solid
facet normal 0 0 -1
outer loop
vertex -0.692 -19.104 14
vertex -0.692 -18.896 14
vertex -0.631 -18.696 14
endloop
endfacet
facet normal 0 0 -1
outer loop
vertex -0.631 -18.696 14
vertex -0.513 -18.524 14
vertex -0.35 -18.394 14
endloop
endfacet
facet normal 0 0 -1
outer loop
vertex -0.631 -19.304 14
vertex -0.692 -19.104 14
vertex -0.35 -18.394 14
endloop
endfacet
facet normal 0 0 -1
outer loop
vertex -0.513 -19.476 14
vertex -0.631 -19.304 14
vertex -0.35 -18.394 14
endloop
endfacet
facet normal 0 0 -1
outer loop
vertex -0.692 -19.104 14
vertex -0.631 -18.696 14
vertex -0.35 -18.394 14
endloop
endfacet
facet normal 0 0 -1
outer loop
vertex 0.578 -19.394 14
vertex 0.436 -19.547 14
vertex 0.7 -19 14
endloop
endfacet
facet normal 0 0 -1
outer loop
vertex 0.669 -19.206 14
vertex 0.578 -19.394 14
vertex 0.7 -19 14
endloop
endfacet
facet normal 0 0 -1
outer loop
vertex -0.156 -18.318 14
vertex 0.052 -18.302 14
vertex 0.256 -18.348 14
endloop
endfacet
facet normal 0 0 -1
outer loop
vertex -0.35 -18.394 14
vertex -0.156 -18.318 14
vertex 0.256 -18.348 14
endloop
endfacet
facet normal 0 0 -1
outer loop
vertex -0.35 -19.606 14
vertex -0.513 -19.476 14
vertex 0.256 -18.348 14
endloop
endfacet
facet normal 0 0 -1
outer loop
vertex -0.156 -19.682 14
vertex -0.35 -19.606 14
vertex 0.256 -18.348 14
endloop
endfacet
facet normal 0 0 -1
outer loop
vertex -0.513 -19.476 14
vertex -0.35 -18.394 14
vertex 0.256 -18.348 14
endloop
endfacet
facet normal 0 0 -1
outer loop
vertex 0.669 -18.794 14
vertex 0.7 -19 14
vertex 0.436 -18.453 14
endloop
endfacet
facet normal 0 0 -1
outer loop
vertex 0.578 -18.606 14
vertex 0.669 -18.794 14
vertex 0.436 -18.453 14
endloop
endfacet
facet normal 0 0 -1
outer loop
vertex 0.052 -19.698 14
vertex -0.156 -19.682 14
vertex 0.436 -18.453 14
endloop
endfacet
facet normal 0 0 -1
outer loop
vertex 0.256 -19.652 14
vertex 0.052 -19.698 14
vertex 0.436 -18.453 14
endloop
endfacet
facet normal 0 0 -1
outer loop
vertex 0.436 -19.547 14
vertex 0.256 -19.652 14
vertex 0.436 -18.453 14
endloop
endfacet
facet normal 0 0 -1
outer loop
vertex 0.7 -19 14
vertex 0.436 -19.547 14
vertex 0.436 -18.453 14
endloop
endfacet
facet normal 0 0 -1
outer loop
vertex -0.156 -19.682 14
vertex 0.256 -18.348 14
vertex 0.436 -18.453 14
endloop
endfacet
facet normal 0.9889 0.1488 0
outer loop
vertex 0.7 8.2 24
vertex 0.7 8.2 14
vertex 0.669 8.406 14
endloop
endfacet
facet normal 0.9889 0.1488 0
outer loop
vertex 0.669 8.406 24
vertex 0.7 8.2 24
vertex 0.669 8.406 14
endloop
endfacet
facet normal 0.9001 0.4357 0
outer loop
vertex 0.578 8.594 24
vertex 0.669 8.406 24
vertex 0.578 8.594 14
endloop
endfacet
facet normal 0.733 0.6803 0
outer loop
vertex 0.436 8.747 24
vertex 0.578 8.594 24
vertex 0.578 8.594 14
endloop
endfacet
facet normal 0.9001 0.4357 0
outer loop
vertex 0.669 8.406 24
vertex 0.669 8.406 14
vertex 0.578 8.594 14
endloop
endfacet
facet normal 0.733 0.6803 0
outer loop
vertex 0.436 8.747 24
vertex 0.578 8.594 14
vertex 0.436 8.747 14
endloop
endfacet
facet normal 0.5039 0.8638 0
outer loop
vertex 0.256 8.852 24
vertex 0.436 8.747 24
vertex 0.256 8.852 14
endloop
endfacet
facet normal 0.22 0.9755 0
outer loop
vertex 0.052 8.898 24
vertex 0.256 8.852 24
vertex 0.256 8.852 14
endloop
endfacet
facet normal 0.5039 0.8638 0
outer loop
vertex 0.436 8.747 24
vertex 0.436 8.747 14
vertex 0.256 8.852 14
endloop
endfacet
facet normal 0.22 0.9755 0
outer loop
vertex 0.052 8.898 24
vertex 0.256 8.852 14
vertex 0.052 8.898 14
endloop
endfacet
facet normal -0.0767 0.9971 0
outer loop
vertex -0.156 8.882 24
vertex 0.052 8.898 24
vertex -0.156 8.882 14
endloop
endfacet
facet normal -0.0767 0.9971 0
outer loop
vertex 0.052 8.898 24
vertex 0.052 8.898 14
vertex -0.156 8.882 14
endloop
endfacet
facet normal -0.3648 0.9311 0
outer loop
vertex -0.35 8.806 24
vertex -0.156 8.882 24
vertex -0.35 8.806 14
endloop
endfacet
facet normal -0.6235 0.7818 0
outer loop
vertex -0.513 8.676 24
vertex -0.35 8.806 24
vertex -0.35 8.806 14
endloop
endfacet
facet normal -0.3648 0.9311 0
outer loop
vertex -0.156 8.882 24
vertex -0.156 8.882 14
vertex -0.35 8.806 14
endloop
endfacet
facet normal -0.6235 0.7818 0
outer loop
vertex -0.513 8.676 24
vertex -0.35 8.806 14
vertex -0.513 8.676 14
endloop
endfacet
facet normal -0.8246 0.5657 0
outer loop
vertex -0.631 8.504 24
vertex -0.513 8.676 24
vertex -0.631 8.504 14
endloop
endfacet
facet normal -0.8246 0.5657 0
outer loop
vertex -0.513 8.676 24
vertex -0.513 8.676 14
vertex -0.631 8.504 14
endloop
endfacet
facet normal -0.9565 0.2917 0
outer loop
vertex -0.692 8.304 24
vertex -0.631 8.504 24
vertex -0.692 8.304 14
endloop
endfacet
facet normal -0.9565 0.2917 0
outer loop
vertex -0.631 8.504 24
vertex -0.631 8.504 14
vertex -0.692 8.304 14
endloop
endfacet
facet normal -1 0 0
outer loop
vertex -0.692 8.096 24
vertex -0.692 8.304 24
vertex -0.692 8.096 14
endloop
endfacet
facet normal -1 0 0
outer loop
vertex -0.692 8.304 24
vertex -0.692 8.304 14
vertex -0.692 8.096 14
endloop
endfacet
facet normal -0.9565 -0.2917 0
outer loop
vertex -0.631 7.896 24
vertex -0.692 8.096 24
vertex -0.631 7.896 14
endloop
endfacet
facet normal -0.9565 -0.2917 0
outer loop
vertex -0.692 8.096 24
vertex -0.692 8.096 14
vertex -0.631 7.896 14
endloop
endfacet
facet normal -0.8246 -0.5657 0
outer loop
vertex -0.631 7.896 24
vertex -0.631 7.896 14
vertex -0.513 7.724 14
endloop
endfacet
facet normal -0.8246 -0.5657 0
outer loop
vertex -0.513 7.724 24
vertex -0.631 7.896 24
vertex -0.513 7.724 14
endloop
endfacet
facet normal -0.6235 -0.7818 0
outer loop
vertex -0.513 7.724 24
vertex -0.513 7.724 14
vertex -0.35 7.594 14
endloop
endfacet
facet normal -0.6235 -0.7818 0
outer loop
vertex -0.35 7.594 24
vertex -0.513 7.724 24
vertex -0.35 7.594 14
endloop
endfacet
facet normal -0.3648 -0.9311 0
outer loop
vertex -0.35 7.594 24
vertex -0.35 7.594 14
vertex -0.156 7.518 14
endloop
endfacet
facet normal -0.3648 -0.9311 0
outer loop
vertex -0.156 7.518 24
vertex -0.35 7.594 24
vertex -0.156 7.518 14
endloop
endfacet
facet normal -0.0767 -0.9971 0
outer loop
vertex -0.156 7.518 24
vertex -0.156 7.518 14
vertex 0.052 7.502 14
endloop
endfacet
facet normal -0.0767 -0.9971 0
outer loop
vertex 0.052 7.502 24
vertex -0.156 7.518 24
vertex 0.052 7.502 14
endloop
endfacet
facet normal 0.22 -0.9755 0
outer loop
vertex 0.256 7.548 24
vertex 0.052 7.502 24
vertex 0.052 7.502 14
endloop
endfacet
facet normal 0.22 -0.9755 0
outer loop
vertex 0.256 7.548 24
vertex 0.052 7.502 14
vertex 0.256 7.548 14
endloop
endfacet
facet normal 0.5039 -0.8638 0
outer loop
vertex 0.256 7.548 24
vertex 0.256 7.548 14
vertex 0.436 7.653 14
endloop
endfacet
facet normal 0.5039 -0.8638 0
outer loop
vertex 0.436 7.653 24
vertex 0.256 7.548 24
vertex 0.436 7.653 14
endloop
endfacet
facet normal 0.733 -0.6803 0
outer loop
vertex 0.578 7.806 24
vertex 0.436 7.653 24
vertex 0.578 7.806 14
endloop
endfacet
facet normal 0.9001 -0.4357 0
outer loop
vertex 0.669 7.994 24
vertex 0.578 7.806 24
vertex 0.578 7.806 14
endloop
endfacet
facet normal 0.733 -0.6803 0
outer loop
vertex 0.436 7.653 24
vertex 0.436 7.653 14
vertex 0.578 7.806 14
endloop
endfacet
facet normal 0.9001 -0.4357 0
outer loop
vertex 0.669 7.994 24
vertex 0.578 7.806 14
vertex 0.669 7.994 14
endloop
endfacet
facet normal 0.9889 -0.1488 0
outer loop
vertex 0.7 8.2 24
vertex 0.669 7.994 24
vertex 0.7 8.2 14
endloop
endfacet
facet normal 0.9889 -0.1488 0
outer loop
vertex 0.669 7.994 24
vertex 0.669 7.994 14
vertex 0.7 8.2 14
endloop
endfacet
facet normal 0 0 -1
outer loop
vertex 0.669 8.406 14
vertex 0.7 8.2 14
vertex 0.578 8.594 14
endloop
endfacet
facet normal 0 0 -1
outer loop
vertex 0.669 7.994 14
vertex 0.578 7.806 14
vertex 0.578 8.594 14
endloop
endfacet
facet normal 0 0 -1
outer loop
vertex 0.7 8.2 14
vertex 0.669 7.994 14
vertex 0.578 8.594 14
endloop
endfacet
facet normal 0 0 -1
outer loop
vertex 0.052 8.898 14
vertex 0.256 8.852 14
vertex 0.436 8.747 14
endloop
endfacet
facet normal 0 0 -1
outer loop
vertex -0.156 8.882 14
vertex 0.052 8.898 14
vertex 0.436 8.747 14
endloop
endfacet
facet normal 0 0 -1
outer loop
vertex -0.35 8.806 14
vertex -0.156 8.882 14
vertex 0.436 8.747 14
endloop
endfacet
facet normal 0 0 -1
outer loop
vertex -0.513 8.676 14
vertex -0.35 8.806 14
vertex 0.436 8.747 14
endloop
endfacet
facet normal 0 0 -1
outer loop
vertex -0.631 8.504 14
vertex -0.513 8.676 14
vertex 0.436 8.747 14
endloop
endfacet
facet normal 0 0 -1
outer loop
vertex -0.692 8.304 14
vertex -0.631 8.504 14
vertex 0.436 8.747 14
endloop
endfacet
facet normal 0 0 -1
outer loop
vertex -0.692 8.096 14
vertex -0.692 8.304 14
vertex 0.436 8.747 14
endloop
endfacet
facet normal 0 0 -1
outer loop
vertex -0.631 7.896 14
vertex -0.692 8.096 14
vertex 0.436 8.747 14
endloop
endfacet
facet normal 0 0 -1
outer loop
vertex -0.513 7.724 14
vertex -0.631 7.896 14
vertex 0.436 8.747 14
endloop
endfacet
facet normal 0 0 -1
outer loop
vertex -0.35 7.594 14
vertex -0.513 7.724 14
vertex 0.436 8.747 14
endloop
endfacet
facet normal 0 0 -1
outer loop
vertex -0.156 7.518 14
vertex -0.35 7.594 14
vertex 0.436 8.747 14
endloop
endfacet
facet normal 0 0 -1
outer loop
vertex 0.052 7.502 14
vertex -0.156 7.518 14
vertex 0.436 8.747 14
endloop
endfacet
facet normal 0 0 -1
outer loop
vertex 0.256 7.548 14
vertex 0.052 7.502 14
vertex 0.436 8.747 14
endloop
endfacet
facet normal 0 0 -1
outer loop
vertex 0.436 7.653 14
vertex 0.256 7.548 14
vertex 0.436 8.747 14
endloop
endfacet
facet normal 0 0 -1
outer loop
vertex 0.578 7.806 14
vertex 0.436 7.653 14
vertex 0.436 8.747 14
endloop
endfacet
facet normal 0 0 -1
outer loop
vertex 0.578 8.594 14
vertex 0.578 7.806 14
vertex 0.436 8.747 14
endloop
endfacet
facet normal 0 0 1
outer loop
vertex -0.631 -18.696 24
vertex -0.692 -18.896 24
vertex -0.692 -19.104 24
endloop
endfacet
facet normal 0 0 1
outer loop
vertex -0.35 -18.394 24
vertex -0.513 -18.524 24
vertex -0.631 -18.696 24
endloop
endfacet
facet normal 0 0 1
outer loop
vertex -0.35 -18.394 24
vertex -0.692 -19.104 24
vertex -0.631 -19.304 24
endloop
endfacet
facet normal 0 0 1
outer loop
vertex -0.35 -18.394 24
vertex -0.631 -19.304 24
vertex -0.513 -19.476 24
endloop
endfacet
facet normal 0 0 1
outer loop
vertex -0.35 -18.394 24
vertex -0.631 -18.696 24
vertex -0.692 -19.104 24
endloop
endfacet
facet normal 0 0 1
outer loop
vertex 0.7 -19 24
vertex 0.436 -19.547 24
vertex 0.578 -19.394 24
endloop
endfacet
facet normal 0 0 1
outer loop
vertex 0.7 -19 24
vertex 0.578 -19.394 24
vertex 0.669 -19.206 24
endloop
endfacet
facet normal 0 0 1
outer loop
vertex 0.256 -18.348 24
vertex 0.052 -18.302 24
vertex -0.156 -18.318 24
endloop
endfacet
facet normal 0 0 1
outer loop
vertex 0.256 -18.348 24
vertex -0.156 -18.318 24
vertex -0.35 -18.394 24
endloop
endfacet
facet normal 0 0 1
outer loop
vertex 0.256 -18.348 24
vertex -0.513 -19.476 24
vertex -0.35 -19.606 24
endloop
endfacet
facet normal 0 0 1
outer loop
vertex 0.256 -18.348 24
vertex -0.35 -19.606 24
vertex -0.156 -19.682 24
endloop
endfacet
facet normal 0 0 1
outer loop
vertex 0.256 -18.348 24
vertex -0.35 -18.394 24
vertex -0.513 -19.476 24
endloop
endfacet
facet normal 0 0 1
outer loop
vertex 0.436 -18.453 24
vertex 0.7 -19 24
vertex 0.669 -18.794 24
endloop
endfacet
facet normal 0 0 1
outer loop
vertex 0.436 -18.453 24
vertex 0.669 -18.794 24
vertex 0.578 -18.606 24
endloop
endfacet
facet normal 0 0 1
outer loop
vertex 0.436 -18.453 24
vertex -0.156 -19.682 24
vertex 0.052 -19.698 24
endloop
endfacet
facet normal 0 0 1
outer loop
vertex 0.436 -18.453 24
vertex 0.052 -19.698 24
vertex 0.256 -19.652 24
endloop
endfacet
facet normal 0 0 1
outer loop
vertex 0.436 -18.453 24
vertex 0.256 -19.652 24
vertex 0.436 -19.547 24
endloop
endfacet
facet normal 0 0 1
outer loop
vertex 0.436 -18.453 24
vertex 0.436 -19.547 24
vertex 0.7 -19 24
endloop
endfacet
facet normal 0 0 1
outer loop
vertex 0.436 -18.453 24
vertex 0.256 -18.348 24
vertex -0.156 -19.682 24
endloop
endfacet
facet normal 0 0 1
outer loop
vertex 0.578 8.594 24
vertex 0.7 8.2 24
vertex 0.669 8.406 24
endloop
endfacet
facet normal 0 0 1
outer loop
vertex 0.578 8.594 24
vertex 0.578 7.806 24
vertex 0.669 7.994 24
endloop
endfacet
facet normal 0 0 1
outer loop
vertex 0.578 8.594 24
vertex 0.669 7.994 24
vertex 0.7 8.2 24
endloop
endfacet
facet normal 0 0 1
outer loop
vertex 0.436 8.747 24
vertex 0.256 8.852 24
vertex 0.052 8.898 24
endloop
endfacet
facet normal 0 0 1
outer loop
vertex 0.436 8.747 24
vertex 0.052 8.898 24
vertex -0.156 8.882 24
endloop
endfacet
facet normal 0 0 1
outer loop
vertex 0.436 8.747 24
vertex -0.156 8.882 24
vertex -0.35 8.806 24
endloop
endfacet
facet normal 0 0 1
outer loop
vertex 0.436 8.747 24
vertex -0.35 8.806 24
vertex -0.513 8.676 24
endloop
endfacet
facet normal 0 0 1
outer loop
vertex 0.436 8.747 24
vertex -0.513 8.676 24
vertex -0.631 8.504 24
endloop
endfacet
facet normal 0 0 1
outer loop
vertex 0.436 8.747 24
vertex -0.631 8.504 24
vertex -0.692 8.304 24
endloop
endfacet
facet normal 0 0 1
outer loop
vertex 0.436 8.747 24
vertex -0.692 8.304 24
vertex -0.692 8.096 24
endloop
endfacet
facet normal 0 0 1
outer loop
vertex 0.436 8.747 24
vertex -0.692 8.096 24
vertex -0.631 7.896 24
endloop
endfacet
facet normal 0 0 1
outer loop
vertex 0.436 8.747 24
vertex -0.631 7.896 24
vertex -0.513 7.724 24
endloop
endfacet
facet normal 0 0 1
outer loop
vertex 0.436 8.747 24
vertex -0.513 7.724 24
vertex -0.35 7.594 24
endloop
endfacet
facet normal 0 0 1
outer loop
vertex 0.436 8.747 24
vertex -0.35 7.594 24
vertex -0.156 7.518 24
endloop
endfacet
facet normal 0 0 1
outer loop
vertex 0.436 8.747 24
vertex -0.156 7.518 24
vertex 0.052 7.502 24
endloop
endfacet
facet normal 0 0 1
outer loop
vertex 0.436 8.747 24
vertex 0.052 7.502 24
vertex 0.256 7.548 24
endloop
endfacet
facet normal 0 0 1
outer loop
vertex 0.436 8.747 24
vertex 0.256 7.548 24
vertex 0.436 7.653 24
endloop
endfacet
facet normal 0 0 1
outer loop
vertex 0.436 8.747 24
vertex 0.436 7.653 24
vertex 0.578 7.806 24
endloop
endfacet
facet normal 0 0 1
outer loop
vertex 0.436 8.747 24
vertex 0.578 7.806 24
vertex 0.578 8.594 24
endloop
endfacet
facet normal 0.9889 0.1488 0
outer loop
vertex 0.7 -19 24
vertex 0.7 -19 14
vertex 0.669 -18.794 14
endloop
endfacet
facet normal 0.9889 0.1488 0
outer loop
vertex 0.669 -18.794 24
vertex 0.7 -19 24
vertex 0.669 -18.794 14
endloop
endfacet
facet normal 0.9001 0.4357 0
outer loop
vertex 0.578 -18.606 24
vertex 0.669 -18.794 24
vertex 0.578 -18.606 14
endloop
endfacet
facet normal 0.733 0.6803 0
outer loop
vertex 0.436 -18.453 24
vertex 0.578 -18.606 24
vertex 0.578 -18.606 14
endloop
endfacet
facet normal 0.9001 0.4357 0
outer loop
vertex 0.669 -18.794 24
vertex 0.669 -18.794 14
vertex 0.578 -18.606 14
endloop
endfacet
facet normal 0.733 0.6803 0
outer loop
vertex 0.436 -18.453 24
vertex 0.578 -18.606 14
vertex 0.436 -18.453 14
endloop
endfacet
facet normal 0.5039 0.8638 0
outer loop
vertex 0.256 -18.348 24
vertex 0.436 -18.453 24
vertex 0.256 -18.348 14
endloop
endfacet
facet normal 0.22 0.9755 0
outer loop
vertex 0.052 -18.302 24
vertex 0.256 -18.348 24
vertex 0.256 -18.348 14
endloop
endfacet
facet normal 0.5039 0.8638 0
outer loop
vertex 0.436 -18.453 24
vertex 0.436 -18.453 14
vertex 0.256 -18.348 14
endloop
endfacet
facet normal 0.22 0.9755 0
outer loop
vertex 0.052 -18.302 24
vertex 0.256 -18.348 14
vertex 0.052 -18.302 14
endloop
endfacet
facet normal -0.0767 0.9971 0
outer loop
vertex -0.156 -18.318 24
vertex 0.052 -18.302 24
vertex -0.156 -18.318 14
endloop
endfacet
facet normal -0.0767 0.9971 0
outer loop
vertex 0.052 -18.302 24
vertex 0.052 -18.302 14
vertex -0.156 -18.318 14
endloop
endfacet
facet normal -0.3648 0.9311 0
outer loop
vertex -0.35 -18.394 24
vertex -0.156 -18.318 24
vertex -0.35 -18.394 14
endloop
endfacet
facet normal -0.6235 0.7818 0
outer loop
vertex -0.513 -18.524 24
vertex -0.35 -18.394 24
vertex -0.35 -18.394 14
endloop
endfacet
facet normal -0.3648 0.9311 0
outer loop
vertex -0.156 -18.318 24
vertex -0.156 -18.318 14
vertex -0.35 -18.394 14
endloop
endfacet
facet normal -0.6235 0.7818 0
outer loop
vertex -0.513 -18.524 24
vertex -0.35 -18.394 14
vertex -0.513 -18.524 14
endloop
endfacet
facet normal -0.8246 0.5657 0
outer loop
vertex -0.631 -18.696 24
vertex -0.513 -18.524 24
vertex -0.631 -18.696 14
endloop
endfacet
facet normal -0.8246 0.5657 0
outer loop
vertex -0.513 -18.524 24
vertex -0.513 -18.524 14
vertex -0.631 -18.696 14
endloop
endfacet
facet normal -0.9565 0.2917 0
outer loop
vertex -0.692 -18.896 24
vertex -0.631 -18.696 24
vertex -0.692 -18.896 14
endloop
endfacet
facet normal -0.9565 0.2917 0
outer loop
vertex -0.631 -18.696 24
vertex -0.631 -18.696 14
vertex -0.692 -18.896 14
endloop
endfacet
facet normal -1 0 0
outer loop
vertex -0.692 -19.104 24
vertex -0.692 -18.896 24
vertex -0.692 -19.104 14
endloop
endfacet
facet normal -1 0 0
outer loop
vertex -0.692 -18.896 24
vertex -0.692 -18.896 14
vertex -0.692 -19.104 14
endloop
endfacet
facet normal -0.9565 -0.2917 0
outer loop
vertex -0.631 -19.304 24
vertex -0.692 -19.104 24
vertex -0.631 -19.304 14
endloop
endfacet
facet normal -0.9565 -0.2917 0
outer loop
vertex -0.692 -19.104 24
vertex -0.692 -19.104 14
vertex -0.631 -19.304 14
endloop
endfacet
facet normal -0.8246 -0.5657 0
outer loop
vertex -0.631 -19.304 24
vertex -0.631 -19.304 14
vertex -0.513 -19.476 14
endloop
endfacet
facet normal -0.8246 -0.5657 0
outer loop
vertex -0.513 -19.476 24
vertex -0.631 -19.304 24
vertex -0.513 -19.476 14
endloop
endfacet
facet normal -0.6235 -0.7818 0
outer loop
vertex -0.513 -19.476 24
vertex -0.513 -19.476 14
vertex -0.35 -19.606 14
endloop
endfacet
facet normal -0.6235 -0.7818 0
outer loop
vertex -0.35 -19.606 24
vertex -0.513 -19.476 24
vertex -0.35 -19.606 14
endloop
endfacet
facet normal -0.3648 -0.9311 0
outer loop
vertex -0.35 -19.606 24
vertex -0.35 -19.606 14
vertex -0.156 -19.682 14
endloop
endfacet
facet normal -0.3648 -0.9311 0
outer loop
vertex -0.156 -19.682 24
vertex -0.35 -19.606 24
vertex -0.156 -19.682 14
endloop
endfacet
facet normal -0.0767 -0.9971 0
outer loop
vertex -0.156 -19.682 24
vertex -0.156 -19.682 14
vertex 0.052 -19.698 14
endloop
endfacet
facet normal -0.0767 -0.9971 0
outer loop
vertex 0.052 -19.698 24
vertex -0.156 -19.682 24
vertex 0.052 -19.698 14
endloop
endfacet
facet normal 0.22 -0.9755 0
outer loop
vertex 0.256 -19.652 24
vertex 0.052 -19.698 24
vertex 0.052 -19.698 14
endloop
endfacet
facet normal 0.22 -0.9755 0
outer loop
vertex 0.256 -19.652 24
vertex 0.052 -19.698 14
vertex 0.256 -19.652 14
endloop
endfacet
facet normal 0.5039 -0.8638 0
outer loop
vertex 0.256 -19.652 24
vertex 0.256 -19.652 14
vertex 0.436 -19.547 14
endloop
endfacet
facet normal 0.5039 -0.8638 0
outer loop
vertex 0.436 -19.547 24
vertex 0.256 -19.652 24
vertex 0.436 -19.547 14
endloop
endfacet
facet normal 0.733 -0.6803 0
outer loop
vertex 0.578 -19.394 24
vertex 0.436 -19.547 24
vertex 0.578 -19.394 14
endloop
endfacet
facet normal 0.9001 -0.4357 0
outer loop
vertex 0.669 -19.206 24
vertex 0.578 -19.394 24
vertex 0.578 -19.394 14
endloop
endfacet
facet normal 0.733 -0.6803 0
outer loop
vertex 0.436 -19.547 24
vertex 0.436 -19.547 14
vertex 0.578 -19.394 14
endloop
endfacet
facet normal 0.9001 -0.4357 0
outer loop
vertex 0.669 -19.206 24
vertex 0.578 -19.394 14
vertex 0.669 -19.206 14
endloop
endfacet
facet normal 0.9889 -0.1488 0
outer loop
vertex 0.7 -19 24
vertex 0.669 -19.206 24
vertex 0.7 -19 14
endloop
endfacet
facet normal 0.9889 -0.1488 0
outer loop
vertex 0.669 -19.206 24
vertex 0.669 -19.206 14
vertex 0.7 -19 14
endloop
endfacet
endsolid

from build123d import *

# Parameters (mm, degrees)
CYLINDER041_R     = 0.7
CYLINDER041_DEPTH = 10
CYLINDER040_R     = 0.7
CYLINDER040_DEPTH = 10


with BuildPart() as taladro014:
    # Cylinder041 → Cylinder041 (new body)
    with BuildSketch(Plane(origin=(0, 8.2, 14), x_dir=(1, 0, 0), z_dir=(0, 0, 1))):
        Circle(CYLINDER041_R)
    extrude(amount=CYLINDER041_DEPTH)


with BuildPart() as taladros_c:
    # Cylinder040 → Cylinder040 (new body)
    with BuildSketch(Plane(origin=(0, -19, 14), x_dir=(1, 0, 0), z_dir=(0, 0, 1))):
        Circle(CYLINDER040_R)
    extrude(amount=CYLINDER040_DEPTH)

    # Fusion019: union Taladro014
    add(taladro014.part)


solid = taladros_c.part
